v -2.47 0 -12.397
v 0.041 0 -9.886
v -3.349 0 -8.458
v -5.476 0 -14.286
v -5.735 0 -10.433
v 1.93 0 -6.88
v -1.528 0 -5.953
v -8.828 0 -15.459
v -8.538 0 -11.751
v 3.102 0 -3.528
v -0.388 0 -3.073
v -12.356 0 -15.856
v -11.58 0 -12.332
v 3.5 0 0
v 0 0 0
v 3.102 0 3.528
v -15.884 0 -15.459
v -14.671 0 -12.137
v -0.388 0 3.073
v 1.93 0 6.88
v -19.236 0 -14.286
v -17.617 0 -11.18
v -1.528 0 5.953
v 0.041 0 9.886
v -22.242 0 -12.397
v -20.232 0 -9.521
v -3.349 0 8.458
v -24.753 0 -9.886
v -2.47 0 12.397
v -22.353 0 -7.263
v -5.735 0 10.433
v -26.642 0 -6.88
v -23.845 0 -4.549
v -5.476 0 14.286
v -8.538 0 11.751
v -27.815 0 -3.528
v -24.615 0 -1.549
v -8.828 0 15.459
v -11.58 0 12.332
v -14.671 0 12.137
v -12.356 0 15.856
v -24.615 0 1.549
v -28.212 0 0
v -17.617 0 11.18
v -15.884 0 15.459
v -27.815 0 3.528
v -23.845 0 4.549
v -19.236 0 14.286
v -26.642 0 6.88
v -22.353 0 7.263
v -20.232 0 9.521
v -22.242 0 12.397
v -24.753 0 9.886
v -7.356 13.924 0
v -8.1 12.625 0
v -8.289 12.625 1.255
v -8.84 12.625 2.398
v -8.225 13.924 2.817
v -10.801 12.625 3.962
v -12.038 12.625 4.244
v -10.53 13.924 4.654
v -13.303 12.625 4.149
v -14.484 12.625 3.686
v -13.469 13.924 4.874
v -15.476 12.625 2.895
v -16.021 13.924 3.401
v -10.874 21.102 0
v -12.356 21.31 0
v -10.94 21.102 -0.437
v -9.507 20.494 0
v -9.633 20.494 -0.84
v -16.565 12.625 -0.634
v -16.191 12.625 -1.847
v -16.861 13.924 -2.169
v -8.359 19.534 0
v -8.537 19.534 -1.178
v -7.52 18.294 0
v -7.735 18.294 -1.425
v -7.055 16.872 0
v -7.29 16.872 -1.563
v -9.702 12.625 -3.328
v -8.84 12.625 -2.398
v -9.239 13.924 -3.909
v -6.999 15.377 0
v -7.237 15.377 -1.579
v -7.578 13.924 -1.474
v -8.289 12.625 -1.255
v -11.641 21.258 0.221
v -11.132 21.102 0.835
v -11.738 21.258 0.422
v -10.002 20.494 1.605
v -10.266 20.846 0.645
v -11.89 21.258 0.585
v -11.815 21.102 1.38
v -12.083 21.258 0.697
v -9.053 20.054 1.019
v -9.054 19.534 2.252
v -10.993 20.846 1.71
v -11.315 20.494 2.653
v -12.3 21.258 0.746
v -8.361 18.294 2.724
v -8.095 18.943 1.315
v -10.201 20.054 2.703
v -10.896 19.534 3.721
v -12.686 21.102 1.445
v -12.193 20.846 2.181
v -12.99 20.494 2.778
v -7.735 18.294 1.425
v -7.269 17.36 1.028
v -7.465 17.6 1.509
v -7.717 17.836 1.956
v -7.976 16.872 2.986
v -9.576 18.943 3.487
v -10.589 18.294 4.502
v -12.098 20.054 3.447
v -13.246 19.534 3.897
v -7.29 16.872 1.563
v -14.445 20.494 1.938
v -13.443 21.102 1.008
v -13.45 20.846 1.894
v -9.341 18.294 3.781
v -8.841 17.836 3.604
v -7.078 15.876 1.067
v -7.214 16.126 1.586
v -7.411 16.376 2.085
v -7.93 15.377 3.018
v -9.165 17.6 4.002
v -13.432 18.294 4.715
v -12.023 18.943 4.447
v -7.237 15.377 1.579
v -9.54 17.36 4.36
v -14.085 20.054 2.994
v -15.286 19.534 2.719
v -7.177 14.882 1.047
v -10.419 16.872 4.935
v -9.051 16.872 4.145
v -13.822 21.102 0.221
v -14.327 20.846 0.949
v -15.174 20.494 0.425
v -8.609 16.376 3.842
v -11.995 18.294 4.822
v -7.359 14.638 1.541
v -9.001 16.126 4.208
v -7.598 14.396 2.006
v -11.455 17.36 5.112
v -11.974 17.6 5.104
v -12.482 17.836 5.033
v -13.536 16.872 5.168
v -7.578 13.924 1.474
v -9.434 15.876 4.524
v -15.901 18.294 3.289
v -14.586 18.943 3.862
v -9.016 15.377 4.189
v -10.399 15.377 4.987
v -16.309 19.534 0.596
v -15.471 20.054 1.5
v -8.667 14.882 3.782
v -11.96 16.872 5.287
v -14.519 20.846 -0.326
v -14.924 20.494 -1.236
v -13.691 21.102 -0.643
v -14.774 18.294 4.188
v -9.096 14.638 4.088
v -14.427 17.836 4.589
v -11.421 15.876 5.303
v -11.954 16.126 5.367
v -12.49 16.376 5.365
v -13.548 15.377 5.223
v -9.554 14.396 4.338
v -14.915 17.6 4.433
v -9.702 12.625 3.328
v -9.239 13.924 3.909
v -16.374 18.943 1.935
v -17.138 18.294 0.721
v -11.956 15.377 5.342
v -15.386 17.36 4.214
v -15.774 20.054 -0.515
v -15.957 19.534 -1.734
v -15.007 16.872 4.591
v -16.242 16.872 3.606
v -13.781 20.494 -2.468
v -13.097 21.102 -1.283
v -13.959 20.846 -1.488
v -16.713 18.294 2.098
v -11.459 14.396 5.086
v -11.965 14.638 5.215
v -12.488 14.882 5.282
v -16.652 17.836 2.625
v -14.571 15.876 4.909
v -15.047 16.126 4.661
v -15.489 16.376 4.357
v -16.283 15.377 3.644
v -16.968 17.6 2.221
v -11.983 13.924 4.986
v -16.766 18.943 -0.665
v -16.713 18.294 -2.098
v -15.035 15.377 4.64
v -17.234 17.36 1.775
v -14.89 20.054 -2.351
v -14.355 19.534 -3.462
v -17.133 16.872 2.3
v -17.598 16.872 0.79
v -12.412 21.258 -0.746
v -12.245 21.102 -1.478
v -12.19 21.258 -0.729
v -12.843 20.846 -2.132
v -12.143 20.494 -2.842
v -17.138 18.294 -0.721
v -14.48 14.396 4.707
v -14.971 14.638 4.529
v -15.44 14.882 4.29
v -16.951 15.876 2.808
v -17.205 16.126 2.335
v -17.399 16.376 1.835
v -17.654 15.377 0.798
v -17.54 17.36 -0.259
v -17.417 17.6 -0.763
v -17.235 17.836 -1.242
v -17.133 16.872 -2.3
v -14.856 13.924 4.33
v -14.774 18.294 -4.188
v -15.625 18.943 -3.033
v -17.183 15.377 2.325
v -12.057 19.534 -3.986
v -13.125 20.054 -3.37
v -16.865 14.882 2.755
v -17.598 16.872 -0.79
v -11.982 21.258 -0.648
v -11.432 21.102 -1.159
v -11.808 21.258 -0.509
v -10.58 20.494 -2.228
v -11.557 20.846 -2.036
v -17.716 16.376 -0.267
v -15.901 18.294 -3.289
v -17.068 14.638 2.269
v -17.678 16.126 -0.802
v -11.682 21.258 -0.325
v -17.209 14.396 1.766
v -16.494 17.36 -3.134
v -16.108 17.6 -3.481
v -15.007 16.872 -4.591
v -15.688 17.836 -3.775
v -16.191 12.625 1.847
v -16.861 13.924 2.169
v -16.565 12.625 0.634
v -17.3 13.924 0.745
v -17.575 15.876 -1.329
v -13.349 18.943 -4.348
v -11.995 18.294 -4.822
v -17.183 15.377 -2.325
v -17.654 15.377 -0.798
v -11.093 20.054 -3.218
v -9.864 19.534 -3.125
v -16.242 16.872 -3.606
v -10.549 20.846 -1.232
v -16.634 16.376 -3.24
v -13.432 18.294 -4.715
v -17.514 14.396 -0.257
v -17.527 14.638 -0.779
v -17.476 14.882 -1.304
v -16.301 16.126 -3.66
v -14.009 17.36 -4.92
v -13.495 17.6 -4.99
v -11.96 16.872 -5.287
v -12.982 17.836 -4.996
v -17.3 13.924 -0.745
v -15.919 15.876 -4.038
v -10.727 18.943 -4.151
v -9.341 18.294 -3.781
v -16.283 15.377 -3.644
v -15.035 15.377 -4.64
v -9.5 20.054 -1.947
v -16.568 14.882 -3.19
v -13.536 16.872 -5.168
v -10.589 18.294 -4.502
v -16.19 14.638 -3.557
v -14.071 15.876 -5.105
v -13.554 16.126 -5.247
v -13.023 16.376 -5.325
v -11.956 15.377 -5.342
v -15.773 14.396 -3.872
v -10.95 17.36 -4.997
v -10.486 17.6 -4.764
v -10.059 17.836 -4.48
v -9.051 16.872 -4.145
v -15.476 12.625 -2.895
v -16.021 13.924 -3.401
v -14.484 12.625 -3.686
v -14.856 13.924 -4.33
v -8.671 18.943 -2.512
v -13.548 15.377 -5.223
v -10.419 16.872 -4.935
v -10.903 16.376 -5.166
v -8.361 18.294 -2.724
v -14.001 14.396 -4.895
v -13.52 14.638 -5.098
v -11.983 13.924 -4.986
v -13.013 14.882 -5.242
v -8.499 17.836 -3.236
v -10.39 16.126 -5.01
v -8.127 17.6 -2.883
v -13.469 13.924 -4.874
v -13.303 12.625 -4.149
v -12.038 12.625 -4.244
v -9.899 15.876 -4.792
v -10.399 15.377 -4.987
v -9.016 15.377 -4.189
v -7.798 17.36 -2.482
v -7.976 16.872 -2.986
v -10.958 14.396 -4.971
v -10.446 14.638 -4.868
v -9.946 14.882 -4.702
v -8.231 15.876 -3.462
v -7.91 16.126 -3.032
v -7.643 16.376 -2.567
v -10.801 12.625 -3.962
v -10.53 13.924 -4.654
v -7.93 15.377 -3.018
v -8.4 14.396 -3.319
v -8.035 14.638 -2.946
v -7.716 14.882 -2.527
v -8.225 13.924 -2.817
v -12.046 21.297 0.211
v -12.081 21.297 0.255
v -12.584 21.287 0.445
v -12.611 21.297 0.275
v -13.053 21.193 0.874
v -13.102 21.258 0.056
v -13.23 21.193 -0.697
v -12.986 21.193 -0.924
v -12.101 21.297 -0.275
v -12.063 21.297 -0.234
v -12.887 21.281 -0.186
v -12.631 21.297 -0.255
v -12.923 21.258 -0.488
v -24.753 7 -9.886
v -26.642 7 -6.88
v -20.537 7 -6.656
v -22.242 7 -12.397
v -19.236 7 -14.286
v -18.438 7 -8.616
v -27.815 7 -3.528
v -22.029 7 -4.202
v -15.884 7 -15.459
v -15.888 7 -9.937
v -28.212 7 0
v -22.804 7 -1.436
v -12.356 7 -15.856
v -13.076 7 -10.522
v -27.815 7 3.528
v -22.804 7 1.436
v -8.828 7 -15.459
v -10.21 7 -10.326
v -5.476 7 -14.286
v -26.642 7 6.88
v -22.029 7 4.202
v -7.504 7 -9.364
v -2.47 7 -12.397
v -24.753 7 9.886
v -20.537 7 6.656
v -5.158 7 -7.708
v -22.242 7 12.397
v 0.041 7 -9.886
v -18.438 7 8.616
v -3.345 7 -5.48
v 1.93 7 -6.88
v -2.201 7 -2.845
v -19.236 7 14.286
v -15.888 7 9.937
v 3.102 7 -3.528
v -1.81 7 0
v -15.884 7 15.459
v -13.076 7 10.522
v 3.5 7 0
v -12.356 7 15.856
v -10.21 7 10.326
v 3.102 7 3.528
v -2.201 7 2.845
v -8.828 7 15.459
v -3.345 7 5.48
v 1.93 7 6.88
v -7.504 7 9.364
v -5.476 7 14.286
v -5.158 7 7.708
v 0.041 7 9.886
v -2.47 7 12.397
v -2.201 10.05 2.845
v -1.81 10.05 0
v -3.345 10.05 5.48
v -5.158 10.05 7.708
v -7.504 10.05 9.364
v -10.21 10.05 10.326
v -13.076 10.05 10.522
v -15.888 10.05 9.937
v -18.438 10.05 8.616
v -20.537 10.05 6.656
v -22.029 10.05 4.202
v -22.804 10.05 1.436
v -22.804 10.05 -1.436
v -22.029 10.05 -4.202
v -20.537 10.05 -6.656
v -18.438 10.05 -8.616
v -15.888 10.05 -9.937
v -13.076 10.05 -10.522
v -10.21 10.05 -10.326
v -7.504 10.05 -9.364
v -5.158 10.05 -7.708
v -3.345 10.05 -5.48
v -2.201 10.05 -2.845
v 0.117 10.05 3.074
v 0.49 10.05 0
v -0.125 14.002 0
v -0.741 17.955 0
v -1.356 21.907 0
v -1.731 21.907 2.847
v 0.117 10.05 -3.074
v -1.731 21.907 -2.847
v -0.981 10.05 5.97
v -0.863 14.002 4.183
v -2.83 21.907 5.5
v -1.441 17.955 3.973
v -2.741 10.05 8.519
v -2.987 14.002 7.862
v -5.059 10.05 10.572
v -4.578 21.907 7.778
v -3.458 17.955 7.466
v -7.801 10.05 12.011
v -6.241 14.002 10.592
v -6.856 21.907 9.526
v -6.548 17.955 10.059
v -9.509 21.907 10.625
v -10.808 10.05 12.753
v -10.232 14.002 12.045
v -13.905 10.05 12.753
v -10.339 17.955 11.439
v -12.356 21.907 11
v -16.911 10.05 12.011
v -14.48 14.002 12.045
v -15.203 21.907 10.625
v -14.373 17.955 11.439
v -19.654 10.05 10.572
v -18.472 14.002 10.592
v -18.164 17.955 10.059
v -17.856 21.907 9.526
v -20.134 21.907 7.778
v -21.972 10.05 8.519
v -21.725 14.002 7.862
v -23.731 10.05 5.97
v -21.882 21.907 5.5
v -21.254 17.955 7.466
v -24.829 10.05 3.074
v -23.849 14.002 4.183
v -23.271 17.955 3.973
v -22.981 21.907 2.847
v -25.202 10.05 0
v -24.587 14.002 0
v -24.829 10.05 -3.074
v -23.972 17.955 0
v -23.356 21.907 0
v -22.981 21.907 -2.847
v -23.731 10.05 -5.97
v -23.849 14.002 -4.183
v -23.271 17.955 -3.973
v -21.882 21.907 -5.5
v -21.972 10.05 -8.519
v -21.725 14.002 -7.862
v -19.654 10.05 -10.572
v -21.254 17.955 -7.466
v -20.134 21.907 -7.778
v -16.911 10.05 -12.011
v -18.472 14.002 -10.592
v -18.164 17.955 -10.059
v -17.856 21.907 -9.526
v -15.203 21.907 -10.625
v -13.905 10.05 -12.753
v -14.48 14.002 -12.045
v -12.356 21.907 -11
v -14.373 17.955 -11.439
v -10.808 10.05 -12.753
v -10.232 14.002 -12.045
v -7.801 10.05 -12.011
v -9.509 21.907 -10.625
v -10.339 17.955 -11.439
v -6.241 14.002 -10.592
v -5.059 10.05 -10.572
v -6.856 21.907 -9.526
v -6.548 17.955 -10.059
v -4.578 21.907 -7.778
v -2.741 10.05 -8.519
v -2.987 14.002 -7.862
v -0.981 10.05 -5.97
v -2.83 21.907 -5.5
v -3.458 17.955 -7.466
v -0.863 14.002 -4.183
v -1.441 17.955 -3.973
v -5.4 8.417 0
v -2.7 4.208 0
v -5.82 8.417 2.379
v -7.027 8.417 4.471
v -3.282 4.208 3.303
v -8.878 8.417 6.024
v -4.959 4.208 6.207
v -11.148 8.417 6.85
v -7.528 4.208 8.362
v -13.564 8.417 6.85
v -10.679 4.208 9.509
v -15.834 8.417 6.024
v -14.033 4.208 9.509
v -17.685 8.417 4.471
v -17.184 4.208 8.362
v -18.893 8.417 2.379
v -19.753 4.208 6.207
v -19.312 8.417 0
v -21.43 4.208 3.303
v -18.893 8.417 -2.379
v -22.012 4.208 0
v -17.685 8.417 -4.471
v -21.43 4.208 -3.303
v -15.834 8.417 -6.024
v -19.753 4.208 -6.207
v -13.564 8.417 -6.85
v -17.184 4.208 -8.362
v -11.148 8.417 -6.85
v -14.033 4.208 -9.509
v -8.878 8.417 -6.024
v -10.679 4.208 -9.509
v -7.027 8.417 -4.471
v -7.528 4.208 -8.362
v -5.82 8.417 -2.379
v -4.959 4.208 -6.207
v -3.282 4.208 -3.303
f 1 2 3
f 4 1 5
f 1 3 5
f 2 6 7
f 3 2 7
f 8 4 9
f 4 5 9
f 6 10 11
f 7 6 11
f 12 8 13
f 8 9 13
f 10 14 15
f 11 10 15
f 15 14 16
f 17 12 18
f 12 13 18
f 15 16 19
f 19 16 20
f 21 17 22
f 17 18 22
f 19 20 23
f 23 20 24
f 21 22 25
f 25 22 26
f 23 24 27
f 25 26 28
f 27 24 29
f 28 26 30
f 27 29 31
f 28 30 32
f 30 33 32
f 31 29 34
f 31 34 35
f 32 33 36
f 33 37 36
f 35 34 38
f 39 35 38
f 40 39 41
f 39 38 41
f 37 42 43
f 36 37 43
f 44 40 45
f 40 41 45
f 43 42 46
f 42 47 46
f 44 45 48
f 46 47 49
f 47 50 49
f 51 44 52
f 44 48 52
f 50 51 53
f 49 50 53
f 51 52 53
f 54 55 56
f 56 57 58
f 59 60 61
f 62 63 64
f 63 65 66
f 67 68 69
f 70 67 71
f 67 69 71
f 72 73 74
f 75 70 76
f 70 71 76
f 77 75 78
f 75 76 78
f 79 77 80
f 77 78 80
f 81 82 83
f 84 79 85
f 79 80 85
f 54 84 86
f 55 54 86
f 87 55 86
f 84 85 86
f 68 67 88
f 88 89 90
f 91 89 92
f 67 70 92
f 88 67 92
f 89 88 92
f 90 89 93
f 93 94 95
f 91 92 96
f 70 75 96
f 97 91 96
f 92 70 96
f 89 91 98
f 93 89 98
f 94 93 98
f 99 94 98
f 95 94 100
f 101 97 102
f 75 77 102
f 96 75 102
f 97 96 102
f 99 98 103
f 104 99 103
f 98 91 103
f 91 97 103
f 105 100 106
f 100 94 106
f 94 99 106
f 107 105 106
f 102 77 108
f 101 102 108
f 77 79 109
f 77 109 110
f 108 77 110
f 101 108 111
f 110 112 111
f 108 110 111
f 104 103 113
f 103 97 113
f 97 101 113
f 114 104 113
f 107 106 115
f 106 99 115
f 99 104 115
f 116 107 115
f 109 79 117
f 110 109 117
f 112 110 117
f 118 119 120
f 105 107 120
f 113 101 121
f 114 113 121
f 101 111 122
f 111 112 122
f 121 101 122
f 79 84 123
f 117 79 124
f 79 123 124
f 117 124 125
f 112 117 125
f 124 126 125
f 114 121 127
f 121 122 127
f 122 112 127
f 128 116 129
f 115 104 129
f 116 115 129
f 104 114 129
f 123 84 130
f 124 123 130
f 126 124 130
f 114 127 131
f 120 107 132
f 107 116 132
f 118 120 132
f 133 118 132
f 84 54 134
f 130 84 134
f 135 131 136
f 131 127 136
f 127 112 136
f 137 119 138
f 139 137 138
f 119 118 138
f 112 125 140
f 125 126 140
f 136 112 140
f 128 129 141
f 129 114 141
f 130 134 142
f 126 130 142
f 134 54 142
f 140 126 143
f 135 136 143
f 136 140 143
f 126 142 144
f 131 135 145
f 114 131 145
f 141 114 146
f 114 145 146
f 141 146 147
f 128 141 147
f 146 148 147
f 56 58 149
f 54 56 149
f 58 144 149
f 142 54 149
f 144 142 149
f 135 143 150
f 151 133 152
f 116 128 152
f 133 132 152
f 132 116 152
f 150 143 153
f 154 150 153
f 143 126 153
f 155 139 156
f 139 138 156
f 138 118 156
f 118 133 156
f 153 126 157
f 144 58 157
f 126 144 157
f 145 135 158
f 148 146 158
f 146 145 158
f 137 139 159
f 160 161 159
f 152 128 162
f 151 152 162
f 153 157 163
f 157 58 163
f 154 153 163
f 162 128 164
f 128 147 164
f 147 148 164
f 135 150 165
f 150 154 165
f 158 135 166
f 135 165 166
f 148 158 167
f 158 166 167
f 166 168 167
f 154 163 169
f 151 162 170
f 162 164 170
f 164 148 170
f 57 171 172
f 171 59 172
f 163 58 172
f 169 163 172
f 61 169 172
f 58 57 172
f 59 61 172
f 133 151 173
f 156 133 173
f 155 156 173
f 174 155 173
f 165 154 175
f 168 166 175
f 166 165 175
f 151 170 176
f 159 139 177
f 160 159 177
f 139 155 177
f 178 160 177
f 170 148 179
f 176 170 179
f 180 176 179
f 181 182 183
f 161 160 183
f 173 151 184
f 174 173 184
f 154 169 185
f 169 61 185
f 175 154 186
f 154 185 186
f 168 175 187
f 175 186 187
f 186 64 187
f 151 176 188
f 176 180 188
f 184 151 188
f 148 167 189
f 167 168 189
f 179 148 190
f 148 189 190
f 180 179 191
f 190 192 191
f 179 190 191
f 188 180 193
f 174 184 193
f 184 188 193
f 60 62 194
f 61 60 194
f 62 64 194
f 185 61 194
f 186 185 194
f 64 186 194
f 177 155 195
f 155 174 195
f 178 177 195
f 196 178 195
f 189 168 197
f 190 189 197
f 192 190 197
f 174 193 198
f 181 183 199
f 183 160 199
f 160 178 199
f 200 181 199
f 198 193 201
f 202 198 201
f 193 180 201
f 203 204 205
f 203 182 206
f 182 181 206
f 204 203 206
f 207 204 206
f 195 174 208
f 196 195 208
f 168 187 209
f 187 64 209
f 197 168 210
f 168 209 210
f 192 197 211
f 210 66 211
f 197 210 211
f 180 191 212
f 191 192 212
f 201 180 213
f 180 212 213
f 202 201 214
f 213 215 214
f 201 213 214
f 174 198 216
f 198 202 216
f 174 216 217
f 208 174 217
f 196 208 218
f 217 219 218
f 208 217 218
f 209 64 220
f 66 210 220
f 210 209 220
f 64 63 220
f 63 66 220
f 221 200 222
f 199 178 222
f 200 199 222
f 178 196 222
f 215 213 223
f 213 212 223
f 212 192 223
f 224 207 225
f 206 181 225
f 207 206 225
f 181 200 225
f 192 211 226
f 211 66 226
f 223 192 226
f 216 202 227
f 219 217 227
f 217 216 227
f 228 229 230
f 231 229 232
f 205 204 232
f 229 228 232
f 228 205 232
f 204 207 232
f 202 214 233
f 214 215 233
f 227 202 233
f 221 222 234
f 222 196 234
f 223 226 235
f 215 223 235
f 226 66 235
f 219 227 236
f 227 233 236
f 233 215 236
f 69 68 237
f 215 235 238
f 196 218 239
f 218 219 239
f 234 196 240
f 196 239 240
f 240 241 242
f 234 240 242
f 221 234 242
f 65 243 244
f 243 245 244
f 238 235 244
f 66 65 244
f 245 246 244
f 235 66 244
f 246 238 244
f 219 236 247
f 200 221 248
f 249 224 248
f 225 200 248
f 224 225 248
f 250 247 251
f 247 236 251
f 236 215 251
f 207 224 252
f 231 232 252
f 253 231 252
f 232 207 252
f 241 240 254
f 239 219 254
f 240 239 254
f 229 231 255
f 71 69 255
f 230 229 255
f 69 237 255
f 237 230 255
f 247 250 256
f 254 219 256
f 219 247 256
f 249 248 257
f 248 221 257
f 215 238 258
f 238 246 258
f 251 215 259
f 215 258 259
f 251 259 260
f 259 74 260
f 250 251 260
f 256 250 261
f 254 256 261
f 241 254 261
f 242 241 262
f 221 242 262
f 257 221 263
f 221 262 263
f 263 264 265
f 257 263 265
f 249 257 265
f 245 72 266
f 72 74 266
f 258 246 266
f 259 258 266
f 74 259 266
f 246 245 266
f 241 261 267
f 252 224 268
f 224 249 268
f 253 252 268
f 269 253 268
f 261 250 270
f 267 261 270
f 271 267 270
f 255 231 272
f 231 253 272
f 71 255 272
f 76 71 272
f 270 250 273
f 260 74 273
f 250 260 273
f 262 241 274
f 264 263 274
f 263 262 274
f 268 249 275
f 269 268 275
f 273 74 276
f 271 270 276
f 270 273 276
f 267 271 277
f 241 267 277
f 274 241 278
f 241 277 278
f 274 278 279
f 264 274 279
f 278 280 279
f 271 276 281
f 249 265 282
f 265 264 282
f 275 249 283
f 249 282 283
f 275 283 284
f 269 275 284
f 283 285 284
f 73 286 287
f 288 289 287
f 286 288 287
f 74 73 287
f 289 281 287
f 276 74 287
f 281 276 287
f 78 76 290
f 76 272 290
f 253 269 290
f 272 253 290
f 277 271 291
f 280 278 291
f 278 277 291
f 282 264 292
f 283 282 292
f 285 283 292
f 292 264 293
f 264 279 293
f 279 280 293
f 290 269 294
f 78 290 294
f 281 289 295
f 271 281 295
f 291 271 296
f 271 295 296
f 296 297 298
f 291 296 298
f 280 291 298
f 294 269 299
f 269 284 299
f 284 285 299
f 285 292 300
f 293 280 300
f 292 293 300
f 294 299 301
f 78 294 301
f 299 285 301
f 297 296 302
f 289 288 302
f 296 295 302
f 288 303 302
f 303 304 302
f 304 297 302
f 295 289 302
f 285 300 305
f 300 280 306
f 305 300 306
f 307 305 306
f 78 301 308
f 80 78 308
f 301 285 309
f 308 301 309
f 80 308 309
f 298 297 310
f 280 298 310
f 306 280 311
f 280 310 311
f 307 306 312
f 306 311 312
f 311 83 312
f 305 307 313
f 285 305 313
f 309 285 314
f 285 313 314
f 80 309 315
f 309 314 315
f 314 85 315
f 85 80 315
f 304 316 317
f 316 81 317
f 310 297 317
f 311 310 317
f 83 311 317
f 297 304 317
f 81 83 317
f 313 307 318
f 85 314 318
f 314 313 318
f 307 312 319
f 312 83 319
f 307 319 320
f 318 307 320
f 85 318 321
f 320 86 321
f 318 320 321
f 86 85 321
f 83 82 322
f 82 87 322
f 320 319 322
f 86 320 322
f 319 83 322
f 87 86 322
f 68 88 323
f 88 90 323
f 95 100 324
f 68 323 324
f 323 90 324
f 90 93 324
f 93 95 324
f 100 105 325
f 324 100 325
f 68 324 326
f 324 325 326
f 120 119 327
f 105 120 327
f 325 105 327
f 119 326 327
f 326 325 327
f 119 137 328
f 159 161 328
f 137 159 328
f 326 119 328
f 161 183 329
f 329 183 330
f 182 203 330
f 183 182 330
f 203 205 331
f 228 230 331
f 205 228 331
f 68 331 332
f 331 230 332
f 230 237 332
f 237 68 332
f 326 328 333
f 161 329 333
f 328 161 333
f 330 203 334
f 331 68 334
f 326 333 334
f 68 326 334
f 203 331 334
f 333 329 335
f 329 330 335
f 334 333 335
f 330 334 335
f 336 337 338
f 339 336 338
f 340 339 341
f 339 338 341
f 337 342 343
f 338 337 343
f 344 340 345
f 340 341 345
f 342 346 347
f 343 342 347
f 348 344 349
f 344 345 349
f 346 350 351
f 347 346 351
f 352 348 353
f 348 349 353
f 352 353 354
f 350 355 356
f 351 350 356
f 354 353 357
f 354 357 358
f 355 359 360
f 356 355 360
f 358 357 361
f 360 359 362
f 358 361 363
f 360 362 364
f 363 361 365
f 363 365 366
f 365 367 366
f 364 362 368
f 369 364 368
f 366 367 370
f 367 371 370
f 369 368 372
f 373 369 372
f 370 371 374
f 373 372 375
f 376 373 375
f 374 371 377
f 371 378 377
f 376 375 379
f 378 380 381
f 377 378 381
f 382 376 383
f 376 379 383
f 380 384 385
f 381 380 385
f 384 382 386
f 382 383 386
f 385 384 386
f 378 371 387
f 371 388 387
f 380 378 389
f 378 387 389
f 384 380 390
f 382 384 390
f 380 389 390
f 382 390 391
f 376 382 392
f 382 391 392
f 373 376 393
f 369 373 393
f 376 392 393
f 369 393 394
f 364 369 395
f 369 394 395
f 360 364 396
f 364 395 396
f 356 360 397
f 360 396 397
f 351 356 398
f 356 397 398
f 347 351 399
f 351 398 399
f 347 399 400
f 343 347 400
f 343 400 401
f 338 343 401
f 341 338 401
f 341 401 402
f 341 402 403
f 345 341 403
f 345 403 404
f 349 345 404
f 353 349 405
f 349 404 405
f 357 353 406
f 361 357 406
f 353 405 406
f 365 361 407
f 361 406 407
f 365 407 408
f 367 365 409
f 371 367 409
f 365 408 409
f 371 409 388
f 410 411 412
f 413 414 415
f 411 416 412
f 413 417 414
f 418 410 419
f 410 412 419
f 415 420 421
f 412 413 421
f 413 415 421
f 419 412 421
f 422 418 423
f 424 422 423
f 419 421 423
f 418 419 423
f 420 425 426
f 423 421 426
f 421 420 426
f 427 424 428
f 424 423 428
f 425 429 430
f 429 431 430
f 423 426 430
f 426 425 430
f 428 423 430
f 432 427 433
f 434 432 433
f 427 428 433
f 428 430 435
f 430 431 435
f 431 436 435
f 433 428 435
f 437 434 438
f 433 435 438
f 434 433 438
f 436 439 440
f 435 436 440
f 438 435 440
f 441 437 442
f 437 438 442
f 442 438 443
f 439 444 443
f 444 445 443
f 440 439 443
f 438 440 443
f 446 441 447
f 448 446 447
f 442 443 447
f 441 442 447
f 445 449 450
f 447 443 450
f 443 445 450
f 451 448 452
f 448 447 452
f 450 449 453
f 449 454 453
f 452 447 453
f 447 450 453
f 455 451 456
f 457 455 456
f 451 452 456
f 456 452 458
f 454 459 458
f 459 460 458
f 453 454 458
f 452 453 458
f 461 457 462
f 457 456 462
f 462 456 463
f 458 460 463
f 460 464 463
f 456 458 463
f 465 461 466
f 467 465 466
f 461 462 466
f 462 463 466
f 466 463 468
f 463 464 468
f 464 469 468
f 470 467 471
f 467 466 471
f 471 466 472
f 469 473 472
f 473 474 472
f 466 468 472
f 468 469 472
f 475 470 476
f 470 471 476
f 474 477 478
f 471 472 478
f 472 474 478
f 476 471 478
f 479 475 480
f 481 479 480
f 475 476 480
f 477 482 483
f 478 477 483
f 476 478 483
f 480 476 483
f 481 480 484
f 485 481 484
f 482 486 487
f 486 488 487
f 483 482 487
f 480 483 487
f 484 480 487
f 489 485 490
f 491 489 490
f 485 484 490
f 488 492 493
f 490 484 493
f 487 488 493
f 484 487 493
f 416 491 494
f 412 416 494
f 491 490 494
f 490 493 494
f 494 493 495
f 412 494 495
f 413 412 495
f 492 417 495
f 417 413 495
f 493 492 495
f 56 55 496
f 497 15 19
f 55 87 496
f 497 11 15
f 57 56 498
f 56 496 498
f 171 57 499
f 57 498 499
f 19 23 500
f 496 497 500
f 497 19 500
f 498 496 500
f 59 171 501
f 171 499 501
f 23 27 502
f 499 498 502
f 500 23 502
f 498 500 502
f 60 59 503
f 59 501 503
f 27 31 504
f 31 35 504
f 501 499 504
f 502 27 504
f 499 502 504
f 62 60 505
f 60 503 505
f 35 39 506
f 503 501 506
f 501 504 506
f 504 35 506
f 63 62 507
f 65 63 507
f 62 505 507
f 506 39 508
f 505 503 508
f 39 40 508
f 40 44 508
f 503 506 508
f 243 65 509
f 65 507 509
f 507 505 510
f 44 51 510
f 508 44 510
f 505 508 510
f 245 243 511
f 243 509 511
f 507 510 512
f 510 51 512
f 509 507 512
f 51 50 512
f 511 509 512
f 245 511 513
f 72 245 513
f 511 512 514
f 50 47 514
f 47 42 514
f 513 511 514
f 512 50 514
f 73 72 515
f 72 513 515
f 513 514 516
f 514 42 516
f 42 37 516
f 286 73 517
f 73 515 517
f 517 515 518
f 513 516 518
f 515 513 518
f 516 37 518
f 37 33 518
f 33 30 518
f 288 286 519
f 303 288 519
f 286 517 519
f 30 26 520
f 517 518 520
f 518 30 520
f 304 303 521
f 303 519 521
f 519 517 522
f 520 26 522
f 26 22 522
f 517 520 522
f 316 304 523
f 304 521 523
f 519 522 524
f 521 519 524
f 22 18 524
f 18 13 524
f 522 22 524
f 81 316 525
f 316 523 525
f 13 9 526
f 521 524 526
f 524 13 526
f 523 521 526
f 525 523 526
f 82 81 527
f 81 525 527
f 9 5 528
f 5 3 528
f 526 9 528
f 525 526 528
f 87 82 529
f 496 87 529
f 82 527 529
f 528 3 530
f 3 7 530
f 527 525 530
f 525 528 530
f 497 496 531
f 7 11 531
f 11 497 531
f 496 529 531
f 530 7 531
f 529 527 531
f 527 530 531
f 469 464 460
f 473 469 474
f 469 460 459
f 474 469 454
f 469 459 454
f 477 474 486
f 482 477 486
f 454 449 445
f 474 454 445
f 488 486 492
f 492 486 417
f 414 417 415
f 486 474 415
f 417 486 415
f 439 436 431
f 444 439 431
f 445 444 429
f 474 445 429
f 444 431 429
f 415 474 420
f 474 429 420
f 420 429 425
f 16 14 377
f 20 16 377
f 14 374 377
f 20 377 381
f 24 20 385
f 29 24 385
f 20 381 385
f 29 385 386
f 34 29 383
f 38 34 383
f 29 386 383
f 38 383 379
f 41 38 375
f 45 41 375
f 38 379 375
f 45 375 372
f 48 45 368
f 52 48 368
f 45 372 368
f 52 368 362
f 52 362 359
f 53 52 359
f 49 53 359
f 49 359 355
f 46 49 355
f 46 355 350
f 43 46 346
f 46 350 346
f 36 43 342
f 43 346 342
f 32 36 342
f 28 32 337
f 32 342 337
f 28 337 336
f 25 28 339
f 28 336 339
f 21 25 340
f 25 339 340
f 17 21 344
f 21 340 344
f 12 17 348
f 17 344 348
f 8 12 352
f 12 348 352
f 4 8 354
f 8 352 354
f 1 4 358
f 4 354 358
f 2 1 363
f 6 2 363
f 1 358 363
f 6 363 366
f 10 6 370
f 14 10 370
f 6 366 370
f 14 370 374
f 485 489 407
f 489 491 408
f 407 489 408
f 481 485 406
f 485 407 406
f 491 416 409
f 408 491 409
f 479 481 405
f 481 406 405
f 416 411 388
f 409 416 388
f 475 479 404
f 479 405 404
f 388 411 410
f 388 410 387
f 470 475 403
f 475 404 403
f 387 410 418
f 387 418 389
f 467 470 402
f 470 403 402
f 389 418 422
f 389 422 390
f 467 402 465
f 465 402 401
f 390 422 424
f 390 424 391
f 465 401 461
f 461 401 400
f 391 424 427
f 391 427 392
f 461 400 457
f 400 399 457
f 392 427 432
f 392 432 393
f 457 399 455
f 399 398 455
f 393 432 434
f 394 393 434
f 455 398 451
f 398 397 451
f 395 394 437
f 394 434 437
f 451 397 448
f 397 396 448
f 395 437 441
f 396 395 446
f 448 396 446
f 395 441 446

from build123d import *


with BuildPart() as f1:
    # F0 (on Top) → F1 (revolve)
    with BuildSketch(Plane.XY):
        with BuildLine():
            Line((-8.1, 12.624975), (0, 0))
            Line((0, 0), (3.5, 0))
            Line((3.5, 0), (3.5, 7))
            Line((3.5, 7), (-1.81, 7))
            Line((-1.81, 7), (-1.81, 10.05))
            Line((-1.81, 10.05), (0.49, 10.05))
            Line((0.49, 10.05), (-1.356164, 21.907136))
            Line((-1.356164, 21.907136), (-12.356164, 21.907136))
            Line((-12.356164, 21.907136), (-12.356164, 21.31))
            ThreePointArc((-12.356164, 21.31), (-7.520242, 18.294486), (-8.1, 12.624975))
        make_face()
    revolve(axis=Axis((-12.356164, 10.953568, 0), (0, -1, 0)))


solid = f1.part
